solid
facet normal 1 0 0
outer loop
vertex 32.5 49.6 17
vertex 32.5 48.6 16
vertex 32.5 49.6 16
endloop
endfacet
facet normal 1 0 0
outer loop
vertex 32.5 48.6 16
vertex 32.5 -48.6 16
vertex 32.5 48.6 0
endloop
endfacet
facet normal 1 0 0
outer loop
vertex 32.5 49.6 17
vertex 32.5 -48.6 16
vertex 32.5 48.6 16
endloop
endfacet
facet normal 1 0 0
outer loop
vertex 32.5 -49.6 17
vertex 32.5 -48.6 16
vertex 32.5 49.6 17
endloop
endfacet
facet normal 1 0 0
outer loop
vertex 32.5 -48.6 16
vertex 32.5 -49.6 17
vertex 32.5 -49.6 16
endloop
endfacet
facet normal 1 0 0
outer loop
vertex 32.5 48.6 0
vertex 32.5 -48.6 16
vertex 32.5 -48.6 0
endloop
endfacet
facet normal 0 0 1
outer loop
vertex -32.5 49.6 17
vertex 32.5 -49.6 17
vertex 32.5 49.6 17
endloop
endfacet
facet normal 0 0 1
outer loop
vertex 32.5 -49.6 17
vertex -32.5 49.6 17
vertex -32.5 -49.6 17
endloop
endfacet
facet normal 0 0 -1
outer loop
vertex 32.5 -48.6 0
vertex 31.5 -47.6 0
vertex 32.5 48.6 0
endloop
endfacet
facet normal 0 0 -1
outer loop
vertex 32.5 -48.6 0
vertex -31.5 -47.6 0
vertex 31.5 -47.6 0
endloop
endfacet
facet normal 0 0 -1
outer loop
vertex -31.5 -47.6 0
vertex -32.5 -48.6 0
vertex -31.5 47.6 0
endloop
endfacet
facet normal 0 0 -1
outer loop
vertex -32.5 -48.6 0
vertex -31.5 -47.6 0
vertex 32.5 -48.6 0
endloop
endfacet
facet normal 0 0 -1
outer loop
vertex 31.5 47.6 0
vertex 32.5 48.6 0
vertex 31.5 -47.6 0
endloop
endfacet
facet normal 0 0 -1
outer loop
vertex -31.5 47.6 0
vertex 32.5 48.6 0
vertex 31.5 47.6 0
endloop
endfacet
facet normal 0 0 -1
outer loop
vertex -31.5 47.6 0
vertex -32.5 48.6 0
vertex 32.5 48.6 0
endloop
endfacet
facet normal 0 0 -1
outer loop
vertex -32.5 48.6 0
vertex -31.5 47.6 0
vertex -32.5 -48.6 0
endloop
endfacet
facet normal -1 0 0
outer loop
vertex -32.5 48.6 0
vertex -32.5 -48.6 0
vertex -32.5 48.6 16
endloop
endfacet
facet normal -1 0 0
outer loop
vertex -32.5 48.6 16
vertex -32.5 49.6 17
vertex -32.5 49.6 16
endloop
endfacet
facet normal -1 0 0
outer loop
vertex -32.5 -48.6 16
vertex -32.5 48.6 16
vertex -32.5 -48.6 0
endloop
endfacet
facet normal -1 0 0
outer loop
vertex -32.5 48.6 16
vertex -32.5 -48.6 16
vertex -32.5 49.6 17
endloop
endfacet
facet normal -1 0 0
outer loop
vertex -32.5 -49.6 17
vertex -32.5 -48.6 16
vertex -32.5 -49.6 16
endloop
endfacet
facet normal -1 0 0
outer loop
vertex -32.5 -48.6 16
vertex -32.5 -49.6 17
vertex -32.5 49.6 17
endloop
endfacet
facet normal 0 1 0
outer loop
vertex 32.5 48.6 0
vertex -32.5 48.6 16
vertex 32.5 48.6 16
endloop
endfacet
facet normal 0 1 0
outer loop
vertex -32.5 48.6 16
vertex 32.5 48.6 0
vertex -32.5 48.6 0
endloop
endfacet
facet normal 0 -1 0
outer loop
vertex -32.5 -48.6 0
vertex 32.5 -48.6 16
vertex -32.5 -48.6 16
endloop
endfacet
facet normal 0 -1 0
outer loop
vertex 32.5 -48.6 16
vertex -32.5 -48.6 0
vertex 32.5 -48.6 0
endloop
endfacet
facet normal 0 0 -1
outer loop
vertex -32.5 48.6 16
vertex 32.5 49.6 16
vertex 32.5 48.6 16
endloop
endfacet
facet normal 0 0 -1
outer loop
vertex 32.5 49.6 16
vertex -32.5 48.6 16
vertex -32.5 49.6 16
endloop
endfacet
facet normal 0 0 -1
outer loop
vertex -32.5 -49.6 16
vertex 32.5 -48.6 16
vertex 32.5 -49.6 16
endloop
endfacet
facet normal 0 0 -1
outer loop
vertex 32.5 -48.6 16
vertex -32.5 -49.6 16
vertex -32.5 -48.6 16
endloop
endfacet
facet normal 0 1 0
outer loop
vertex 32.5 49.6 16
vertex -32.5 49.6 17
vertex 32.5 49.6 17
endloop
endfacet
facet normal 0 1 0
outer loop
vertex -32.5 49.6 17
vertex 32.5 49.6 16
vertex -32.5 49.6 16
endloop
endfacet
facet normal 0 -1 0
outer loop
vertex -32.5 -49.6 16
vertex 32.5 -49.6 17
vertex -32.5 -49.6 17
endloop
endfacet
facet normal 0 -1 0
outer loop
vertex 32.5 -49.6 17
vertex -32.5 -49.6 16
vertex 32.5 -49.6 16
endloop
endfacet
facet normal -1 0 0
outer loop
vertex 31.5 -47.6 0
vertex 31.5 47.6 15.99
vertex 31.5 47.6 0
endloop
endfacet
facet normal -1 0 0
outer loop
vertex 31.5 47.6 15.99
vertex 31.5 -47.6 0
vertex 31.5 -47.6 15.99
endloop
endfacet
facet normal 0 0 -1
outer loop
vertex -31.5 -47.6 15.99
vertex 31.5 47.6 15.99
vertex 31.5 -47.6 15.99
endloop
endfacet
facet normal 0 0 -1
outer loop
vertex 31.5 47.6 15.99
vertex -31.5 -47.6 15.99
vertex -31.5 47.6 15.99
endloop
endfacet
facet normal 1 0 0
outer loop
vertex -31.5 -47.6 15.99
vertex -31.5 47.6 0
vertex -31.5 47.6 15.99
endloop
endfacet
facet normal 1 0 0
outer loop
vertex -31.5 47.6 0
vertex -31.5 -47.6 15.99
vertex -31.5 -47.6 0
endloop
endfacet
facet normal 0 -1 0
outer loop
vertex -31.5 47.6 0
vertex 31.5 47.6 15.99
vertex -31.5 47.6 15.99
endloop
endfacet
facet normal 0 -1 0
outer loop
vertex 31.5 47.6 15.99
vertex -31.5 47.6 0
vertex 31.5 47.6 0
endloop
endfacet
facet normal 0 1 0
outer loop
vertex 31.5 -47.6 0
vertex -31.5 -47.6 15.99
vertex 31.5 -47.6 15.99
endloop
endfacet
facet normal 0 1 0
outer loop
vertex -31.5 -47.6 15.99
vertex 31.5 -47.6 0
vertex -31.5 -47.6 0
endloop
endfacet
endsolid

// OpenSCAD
// Cap for Swedish yoghurt tetra paks
// Print in Flex-98 or something

module aligned_cube( size, align = [ 0, 0, 0 ] )
  translate(-size/2*[[align[0],0,0],[0,align[1],0],[0,0,align[2]]])
  cube( size, center = false );

translate([0,0,0]) {
    difference() {
        union() {
            aligned_cube([65, 97.2, 17], [1, 1, 0]);
            translate([0,0,16])
            aligned_cube([65, 99.2, 1], [1, 1, 0]);
        };
        translate([0,0,-0.01])
        aligned_cube([63, 95.2, 16], [1, 1, 0]);
    }
}

echo(version=version());
